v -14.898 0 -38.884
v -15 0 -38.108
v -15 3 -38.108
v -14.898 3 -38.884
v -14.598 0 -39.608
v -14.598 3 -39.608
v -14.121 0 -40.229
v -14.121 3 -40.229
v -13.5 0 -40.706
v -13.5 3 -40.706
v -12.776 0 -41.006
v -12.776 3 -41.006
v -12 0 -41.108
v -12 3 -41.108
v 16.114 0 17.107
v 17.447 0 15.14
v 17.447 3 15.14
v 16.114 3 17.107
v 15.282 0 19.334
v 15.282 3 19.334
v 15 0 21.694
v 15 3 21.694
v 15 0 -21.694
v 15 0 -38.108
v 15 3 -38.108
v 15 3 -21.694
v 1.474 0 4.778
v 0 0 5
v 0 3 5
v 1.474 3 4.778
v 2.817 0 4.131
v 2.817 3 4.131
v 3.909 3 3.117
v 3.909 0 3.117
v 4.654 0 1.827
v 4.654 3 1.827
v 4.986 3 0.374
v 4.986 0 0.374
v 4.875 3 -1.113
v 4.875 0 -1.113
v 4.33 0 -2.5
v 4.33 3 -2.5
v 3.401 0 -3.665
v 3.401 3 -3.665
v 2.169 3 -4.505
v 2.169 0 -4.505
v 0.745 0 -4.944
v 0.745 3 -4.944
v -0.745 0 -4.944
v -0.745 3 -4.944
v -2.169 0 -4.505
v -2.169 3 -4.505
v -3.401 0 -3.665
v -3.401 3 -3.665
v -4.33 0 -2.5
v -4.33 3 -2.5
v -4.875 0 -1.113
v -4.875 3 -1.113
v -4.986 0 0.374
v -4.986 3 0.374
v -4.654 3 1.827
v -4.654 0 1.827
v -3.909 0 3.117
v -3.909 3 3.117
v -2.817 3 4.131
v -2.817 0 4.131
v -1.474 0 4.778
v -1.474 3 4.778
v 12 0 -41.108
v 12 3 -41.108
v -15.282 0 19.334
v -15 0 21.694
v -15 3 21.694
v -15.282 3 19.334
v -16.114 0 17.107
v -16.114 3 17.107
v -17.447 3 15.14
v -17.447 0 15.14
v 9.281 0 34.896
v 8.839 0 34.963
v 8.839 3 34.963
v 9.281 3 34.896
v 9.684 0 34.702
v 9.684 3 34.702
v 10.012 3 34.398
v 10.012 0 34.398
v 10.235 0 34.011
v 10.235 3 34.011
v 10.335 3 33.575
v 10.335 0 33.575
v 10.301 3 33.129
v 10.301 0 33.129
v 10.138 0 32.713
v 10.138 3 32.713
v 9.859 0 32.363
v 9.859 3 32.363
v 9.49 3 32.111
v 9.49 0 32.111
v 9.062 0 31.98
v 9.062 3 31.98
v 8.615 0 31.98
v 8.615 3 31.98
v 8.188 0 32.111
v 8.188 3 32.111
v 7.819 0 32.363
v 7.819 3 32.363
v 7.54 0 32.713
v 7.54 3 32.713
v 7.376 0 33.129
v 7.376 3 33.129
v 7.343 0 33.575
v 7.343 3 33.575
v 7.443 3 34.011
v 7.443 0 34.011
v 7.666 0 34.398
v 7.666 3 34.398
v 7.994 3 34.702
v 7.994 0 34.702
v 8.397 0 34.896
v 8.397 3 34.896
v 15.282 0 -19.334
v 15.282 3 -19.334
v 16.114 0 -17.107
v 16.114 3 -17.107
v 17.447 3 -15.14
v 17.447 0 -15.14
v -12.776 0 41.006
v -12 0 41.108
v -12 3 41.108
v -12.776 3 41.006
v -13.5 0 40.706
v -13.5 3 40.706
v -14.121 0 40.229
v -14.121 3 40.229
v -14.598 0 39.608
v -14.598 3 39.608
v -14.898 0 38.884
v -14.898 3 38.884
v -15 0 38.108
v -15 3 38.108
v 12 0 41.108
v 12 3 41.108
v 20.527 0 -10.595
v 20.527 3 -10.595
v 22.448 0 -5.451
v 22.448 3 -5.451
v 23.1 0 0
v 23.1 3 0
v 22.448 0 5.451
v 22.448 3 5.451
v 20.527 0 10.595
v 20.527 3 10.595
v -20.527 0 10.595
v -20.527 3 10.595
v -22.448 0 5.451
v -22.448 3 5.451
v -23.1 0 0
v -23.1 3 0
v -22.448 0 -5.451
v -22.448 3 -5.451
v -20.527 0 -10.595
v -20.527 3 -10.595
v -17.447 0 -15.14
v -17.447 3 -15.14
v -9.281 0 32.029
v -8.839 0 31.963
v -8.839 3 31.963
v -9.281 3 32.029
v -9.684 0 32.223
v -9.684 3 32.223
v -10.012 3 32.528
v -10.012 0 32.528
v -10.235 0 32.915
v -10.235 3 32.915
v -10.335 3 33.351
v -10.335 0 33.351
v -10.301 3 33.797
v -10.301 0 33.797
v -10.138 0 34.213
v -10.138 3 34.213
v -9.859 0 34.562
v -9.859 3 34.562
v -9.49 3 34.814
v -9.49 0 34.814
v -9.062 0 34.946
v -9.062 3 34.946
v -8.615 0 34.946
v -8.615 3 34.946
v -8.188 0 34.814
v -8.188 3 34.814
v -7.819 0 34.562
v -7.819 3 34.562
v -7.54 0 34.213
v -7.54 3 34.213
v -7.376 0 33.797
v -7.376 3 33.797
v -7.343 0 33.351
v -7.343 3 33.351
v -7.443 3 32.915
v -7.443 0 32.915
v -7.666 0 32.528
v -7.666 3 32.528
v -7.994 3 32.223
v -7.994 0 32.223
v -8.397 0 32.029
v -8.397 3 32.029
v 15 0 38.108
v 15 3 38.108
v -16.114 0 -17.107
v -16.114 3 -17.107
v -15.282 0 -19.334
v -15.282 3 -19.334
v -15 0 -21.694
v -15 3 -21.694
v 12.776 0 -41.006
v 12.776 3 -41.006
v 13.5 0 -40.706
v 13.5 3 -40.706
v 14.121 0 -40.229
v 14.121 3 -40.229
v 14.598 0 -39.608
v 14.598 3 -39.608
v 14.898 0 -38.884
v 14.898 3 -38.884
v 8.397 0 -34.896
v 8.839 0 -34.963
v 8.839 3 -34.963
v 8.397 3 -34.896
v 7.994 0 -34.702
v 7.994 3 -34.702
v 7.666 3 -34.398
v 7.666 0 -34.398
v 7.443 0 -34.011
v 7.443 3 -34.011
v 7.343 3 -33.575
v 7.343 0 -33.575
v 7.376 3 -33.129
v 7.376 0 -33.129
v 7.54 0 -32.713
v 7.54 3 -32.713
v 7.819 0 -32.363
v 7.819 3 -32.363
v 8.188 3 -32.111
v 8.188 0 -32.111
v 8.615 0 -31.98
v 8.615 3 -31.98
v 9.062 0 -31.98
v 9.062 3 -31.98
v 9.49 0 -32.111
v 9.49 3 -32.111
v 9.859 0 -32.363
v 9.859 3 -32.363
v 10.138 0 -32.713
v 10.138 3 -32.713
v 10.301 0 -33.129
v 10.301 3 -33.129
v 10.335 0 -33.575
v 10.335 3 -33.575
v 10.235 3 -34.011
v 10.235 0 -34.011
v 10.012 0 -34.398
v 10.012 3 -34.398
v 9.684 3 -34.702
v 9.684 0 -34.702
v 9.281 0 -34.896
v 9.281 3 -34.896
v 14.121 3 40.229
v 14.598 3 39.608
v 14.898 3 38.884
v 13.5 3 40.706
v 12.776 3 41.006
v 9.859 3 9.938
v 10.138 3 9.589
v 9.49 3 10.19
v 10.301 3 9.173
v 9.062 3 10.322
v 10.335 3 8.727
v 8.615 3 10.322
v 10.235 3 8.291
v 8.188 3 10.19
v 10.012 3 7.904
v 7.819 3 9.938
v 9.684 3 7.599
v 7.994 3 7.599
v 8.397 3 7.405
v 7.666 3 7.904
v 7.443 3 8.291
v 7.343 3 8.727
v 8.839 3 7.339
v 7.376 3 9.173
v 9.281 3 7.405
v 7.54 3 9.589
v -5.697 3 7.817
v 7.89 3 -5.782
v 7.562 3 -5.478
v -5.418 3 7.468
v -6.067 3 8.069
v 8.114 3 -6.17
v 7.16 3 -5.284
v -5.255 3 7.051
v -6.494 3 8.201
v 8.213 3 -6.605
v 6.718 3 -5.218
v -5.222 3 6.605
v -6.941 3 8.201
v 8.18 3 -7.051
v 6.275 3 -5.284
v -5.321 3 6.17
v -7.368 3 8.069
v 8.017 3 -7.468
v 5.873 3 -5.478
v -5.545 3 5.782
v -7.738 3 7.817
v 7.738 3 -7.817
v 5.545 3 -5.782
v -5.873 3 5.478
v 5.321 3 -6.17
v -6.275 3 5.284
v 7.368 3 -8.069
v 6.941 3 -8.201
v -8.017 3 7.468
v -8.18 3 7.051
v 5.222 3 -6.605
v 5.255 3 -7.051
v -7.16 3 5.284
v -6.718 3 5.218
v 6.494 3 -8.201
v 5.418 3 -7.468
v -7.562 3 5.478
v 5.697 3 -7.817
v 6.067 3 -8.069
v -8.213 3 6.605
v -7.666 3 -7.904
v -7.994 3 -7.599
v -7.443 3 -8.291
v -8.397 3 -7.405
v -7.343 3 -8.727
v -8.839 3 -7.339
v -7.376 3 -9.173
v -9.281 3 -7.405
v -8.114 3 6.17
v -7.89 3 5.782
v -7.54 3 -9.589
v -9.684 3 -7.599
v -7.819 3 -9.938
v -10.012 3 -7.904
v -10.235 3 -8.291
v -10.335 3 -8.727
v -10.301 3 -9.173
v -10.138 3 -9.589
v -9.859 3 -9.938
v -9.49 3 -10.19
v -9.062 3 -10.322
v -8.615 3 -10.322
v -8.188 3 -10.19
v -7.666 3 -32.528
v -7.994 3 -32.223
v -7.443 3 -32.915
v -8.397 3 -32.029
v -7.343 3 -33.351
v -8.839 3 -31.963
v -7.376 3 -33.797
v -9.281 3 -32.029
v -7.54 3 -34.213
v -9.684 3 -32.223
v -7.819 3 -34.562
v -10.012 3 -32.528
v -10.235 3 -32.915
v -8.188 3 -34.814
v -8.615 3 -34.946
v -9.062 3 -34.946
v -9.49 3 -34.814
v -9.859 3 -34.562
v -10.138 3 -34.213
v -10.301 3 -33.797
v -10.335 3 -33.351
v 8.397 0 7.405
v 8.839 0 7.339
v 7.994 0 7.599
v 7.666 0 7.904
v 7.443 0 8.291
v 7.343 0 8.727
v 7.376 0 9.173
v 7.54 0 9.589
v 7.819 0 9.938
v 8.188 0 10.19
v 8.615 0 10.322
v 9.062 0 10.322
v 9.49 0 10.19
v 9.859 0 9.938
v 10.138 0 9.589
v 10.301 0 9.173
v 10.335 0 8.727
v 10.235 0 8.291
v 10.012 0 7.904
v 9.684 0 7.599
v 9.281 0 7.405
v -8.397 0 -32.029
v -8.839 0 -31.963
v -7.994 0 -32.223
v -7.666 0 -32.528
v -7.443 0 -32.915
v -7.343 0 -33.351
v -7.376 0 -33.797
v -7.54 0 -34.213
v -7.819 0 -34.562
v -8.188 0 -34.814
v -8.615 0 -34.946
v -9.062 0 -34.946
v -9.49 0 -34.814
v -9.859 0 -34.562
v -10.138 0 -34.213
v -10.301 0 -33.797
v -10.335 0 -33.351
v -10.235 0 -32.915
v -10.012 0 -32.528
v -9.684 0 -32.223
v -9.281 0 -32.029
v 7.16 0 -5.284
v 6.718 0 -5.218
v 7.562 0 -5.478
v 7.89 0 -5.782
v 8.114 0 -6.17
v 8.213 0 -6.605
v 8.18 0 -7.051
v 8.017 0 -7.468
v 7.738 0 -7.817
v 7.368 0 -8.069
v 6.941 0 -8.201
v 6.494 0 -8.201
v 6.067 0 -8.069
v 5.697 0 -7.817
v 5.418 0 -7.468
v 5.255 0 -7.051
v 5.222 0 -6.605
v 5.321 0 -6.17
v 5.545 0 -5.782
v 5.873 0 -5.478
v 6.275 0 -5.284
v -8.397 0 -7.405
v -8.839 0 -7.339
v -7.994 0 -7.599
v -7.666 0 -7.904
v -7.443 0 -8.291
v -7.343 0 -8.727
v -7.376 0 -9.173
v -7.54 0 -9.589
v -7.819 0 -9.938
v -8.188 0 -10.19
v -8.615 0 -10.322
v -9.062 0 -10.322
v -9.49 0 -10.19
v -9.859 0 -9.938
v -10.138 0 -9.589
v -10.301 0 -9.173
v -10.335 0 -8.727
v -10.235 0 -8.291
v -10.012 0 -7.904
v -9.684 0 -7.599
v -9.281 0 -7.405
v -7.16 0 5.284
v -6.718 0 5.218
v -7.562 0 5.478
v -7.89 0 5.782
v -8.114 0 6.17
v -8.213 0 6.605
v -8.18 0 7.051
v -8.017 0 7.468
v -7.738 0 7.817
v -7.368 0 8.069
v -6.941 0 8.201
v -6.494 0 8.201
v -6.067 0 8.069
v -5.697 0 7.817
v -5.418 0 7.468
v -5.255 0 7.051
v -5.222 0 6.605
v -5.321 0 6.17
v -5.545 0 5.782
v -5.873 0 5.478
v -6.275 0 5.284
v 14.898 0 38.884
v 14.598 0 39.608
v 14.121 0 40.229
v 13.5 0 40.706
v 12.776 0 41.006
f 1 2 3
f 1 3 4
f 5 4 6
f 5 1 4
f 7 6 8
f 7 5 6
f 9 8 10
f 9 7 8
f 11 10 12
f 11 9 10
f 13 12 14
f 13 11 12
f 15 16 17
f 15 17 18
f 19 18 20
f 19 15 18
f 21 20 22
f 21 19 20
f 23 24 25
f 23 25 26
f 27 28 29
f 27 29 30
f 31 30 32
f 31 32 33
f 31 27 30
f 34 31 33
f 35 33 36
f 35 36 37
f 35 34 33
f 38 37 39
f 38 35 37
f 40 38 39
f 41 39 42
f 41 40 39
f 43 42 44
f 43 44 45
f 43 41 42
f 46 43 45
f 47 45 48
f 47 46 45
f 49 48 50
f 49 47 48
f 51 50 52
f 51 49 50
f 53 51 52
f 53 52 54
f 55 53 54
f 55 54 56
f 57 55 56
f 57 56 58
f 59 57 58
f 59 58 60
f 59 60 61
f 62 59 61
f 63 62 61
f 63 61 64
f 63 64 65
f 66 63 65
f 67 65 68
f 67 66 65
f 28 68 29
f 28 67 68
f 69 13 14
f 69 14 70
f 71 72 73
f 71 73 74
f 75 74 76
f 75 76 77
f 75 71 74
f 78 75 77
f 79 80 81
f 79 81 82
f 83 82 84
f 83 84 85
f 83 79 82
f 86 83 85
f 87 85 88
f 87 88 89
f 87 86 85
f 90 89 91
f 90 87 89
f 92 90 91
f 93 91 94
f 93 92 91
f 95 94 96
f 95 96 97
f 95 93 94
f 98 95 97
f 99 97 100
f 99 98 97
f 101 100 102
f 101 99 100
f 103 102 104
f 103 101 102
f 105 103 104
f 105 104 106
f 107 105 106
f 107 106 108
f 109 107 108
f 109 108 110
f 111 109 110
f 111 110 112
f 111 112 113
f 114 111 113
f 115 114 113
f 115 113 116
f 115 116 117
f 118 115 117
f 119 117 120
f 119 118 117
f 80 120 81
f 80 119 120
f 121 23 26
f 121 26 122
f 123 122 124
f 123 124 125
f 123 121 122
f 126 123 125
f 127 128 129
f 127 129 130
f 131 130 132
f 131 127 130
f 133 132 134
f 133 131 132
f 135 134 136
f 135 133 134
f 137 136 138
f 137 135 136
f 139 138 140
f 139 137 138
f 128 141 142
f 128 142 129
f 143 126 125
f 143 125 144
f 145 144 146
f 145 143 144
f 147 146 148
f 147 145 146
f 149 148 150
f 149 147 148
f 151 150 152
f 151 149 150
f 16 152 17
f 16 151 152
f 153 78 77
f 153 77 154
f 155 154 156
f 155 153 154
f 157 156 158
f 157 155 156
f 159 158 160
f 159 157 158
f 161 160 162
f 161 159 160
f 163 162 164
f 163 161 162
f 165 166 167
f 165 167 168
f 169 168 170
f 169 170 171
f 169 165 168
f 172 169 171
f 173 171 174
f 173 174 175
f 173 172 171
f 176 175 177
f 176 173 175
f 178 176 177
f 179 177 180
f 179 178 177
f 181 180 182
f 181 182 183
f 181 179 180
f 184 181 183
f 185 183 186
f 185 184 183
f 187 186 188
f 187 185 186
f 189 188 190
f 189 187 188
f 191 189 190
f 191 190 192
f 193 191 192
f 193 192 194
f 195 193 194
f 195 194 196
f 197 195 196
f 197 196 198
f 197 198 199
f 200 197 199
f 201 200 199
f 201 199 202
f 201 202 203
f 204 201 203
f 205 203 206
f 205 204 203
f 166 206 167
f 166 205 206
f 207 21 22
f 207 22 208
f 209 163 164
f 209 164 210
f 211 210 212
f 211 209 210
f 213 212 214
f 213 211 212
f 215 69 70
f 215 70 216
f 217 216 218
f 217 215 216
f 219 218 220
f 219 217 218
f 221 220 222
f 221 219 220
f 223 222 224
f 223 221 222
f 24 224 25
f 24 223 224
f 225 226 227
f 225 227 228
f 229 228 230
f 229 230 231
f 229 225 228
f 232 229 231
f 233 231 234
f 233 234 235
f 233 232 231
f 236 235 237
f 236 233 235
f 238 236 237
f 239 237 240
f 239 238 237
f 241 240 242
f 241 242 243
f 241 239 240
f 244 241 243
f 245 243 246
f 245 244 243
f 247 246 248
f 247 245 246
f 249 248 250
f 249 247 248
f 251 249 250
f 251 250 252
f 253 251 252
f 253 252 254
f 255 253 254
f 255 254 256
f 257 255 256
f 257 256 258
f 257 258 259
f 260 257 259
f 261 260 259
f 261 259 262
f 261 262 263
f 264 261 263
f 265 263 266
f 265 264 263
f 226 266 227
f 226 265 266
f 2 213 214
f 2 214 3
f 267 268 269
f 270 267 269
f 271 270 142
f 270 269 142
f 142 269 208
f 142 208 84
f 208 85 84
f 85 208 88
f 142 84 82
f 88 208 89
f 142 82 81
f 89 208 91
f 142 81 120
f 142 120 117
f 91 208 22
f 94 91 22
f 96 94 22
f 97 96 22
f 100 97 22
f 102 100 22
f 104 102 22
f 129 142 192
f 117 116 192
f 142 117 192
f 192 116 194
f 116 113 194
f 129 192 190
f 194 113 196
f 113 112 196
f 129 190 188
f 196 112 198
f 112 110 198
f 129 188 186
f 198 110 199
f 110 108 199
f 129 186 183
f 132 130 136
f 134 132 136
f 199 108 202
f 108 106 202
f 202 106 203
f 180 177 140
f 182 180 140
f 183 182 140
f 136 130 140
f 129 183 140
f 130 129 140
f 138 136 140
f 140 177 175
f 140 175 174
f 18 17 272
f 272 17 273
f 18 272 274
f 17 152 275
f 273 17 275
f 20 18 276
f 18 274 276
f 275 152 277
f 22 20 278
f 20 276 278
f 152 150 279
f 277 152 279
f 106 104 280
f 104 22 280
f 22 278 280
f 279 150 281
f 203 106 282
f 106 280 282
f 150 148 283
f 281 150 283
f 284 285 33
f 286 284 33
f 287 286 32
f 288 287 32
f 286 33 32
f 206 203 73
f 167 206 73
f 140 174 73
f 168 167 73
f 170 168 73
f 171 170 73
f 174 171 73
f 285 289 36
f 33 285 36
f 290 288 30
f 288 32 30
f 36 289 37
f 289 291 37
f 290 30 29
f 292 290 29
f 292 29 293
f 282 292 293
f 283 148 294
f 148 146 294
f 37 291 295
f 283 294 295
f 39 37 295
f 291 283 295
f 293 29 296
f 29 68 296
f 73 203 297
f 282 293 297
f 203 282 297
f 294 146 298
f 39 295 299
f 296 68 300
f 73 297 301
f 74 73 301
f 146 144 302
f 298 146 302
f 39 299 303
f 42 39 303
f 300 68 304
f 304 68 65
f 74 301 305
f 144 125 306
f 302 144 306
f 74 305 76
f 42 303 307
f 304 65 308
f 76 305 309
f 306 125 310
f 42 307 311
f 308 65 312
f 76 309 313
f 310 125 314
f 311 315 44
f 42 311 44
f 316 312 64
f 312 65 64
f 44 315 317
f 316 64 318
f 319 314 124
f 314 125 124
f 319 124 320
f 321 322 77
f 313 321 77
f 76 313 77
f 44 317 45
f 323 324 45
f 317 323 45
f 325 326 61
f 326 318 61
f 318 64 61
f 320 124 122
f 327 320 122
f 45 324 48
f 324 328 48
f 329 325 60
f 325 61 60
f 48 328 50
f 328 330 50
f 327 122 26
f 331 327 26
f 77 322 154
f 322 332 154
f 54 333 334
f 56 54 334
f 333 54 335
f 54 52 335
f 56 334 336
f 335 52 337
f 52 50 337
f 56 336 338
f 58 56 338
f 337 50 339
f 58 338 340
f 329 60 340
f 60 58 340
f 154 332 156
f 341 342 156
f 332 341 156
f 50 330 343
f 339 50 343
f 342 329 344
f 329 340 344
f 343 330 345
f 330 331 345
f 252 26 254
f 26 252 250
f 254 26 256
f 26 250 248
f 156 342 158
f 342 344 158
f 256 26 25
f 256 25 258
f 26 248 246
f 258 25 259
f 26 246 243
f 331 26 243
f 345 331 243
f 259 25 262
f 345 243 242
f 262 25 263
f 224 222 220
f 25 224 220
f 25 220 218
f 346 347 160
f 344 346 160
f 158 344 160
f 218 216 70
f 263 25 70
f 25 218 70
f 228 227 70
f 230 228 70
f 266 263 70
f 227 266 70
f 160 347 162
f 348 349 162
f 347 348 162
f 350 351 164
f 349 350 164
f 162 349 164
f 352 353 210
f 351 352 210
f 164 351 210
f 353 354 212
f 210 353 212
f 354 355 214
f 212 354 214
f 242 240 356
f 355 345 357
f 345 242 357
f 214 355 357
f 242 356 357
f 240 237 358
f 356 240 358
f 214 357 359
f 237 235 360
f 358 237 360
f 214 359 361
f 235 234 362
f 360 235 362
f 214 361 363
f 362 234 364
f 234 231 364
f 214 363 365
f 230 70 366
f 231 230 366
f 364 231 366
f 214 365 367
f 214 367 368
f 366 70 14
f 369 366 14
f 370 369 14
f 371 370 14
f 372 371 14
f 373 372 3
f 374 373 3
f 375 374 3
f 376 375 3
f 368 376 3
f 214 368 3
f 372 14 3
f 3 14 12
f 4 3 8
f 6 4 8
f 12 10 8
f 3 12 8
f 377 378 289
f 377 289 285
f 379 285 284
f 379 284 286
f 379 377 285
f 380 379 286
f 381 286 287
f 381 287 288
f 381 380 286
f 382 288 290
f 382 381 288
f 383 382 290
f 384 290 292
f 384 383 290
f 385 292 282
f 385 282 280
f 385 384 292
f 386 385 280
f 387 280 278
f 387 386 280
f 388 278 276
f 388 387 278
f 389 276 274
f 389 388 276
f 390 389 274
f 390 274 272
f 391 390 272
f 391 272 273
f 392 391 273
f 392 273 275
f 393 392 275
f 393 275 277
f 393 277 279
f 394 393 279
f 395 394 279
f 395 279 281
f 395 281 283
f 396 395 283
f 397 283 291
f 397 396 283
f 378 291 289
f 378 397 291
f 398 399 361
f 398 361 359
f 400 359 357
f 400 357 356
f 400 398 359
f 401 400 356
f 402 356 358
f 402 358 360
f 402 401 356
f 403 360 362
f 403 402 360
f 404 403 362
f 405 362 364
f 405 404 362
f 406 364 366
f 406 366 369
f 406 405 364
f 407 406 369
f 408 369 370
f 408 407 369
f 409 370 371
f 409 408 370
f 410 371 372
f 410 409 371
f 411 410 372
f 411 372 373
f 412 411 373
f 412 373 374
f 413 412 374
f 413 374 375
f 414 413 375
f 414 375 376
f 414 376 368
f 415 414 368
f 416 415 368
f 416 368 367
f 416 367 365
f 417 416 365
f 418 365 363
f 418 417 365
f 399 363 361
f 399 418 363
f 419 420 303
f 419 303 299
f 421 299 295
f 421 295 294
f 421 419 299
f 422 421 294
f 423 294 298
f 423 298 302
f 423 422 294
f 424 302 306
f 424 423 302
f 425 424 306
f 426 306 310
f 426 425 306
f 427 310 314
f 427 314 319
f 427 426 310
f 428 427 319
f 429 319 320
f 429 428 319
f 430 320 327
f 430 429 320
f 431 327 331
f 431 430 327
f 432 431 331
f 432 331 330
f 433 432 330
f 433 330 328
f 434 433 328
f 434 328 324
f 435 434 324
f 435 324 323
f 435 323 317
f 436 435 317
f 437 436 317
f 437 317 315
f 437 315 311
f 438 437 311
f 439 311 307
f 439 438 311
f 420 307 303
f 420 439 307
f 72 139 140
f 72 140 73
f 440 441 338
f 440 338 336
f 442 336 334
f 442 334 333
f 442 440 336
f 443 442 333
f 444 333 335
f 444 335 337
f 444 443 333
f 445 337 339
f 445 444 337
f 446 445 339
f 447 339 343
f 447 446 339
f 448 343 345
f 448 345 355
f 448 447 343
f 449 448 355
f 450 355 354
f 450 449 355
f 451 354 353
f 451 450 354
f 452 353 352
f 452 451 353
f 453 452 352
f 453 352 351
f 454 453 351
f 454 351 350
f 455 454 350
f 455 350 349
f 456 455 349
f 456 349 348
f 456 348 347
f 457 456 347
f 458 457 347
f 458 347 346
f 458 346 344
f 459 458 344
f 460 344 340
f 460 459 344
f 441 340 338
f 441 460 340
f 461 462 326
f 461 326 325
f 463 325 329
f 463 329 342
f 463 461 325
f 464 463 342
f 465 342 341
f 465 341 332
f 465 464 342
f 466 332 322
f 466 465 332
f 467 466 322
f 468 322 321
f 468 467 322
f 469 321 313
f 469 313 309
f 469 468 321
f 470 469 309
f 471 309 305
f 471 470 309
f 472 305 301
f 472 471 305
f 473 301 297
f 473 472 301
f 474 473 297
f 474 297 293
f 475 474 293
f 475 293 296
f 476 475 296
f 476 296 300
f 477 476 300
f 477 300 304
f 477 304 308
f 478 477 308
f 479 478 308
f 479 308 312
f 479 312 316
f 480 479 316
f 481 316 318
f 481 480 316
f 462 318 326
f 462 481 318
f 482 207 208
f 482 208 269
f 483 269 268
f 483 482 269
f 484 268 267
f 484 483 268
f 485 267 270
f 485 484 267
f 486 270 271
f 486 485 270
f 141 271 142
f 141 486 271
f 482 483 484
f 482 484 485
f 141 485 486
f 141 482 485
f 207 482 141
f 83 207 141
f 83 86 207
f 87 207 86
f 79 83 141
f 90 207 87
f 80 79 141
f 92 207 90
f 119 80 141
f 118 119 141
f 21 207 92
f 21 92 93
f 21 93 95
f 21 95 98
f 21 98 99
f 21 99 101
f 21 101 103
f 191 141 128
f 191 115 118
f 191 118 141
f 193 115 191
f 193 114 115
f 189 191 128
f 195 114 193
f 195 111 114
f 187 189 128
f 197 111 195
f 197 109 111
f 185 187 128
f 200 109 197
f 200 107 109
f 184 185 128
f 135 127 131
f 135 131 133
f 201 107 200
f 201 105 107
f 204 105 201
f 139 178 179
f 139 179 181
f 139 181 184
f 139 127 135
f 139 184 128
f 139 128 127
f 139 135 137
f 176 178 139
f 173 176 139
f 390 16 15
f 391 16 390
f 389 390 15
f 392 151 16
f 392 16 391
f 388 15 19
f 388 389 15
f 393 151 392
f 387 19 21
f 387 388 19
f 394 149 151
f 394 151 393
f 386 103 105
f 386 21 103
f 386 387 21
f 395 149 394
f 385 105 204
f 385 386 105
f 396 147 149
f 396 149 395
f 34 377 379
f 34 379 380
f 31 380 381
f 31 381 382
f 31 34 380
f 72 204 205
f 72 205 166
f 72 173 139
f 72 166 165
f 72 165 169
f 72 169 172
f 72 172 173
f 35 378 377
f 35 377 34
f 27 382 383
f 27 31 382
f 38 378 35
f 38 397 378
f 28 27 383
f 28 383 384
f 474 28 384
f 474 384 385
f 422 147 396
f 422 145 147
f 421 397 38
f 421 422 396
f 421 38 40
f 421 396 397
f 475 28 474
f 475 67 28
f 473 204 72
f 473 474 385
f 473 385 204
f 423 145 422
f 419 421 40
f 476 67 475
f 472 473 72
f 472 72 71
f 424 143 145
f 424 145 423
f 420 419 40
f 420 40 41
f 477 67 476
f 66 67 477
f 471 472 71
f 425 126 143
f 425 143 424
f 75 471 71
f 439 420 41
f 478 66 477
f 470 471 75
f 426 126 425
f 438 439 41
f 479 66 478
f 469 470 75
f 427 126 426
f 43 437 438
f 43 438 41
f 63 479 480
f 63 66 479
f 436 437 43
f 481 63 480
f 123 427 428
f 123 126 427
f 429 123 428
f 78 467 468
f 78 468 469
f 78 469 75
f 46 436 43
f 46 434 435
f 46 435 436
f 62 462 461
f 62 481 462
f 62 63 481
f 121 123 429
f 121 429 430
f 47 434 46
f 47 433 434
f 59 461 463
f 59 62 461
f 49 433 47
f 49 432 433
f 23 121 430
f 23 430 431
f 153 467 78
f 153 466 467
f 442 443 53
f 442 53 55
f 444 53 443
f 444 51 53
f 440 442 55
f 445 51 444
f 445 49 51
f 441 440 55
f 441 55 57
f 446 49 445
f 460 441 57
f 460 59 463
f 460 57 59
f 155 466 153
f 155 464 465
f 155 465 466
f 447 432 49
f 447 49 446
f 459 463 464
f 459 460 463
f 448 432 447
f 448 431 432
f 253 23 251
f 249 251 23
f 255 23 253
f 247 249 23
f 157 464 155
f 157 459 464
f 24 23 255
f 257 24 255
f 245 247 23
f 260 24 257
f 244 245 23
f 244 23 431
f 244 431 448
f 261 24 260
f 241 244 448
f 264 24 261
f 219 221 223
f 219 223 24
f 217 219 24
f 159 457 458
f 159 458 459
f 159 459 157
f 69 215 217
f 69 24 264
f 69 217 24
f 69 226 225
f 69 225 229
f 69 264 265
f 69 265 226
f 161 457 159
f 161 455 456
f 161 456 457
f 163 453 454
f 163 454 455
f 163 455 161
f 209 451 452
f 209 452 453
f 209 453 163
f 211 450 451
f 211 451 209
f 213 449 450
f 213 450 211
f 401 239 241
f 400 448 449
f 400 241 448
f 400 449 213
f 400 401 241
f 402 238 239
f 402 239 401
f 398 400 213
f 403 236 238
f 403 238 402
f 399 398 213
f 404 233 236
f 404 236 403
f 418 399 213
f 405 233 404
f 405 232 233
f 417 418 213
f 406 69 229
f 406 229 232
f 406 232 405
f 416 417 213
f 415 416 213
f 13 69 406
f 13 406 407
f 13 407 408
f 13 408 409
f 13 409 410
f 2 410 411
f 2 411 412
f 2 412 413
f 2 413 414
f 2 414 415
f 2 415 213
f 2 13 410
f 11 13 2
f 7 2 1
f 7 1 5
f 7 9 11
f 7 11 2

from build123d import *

# Parameters (mm, degrees)
SKETCH1_R           = 1.5
SKETCH1_R_2         = 5
BOSS_EXTRUDE1_DEPTH = 3


with BuildPart() as part:
    # Sketch1 → Boss-Extrude1 (new body)
    with BuildSketch(Plane(origin=(0, 0, 0), x_dir=(1, 0, 0), z_dir=(0, 1, 0))):
        with BuildLine():
            Line((-15, 21.693547428), (-15, 38.108016468))
            ThreePointArc((-15, 38.108016468), (-14.121320344, 40.229336812), (-12, 41.108016468))
            Line((-12, 41.108016468), (12, 41.108016468))
            ThreePointArc((12, 41.108016468), (14.121320344, 40.229336812), (15, 38.108016468))
            Line((15, 38.108016468), (15, 21.693547428))
            ThreePointArc((15, 21.693547428), (15.631737063, 18.195598093), (17.447129909, 15.139605607))
            ThreePointArc((17.447129909, 15.139605607), (23.1, 0), (17.447129909, -15.139605607))
            ThreePointArc((17.447129909, -15.139605607), (15.631737063, -18.195598093), (15, -21.693547428))
            Line((15, -21.693547428), (15, -38.108016468))
            ThreePointArc((15, -38.108016468), (14.121320344, -40.229336812), (12, -41.108016468))
            Line((12, -41.108016468), (-12, -41.108016468))
            ThreePointArc((-12, -41.108016468), (-14.121320344, -40.229336812), (-15, -38.108016468))
            Line((-15, -38.108016468), (-15, -21.693547428))
            ThreePointArc((-15, -21.693547428), (-15.631737063, -18.195598093), (-17.447129909, -15.139605607))
            ThreePointArc((-17.447129909, -15.139605607), (-23.1, 0), (-17.447129909, 15.139605607))
            ThreePointArc((-17.447129909, 15.139605607), (-15.631737063, 18.195598093), (-15, 21.693547428))
        make_face()
        with Locations(Location((-8.838834765, 8.838834765, 0), (0, 0, 270))):
            Circle(SKETCH1_R, mode=Mode.SUBTRACT)
        with Locations(Location((8.838834765, -8.838834765, 0), (0, 0, 90))):
            Circle(SKETCH1_R, mode=Mode.SUBTRACT)
        with Locations(Location((6.717514421, 6.717514421, 0), (0, 0, 270))):
            Circle(SKETCH1_R, mode=Mode.SUBTRACT)
        with Locations(Location((-6.717514421, -6.717514421, 0), (0, 0, 90))):
            Circle(SKETCH1_R, mode=Mode.SUBTRACT)
        with Locations(Location((0, 0, 0), (0, 0, 270))):
            Circle(SKETCH1_R_2, mode=Mode.SUBTRACT)
        with Locations(Location((-8.838834765, 33.462792438, 0), (0, 0, 270))):
            Circle(SKETCH1_R, mode=Mode.SUBTRACT)
        with Locations(Location((8.838834765, 33.462792438, 0), (0, 0, 90))):
            Circle(SKETCH1_R, mode=Mode.SUBTRACT)
        with Locations(Location((8.838834765, -33.462792438, 0), (0, 0, 270))):
            Circle(SKETCH1_R, mode=Mode.SUBTRACT)
        with Locations(Location((-8.838834765, -33.462792438, 0), (0, 0, 90))):
            Circle(SKETCH1_R, mode=Mode.SUBTRACT)
    extrude(amount=BOSS_EXTRUDE1_DEPTH)


solid = part.part
